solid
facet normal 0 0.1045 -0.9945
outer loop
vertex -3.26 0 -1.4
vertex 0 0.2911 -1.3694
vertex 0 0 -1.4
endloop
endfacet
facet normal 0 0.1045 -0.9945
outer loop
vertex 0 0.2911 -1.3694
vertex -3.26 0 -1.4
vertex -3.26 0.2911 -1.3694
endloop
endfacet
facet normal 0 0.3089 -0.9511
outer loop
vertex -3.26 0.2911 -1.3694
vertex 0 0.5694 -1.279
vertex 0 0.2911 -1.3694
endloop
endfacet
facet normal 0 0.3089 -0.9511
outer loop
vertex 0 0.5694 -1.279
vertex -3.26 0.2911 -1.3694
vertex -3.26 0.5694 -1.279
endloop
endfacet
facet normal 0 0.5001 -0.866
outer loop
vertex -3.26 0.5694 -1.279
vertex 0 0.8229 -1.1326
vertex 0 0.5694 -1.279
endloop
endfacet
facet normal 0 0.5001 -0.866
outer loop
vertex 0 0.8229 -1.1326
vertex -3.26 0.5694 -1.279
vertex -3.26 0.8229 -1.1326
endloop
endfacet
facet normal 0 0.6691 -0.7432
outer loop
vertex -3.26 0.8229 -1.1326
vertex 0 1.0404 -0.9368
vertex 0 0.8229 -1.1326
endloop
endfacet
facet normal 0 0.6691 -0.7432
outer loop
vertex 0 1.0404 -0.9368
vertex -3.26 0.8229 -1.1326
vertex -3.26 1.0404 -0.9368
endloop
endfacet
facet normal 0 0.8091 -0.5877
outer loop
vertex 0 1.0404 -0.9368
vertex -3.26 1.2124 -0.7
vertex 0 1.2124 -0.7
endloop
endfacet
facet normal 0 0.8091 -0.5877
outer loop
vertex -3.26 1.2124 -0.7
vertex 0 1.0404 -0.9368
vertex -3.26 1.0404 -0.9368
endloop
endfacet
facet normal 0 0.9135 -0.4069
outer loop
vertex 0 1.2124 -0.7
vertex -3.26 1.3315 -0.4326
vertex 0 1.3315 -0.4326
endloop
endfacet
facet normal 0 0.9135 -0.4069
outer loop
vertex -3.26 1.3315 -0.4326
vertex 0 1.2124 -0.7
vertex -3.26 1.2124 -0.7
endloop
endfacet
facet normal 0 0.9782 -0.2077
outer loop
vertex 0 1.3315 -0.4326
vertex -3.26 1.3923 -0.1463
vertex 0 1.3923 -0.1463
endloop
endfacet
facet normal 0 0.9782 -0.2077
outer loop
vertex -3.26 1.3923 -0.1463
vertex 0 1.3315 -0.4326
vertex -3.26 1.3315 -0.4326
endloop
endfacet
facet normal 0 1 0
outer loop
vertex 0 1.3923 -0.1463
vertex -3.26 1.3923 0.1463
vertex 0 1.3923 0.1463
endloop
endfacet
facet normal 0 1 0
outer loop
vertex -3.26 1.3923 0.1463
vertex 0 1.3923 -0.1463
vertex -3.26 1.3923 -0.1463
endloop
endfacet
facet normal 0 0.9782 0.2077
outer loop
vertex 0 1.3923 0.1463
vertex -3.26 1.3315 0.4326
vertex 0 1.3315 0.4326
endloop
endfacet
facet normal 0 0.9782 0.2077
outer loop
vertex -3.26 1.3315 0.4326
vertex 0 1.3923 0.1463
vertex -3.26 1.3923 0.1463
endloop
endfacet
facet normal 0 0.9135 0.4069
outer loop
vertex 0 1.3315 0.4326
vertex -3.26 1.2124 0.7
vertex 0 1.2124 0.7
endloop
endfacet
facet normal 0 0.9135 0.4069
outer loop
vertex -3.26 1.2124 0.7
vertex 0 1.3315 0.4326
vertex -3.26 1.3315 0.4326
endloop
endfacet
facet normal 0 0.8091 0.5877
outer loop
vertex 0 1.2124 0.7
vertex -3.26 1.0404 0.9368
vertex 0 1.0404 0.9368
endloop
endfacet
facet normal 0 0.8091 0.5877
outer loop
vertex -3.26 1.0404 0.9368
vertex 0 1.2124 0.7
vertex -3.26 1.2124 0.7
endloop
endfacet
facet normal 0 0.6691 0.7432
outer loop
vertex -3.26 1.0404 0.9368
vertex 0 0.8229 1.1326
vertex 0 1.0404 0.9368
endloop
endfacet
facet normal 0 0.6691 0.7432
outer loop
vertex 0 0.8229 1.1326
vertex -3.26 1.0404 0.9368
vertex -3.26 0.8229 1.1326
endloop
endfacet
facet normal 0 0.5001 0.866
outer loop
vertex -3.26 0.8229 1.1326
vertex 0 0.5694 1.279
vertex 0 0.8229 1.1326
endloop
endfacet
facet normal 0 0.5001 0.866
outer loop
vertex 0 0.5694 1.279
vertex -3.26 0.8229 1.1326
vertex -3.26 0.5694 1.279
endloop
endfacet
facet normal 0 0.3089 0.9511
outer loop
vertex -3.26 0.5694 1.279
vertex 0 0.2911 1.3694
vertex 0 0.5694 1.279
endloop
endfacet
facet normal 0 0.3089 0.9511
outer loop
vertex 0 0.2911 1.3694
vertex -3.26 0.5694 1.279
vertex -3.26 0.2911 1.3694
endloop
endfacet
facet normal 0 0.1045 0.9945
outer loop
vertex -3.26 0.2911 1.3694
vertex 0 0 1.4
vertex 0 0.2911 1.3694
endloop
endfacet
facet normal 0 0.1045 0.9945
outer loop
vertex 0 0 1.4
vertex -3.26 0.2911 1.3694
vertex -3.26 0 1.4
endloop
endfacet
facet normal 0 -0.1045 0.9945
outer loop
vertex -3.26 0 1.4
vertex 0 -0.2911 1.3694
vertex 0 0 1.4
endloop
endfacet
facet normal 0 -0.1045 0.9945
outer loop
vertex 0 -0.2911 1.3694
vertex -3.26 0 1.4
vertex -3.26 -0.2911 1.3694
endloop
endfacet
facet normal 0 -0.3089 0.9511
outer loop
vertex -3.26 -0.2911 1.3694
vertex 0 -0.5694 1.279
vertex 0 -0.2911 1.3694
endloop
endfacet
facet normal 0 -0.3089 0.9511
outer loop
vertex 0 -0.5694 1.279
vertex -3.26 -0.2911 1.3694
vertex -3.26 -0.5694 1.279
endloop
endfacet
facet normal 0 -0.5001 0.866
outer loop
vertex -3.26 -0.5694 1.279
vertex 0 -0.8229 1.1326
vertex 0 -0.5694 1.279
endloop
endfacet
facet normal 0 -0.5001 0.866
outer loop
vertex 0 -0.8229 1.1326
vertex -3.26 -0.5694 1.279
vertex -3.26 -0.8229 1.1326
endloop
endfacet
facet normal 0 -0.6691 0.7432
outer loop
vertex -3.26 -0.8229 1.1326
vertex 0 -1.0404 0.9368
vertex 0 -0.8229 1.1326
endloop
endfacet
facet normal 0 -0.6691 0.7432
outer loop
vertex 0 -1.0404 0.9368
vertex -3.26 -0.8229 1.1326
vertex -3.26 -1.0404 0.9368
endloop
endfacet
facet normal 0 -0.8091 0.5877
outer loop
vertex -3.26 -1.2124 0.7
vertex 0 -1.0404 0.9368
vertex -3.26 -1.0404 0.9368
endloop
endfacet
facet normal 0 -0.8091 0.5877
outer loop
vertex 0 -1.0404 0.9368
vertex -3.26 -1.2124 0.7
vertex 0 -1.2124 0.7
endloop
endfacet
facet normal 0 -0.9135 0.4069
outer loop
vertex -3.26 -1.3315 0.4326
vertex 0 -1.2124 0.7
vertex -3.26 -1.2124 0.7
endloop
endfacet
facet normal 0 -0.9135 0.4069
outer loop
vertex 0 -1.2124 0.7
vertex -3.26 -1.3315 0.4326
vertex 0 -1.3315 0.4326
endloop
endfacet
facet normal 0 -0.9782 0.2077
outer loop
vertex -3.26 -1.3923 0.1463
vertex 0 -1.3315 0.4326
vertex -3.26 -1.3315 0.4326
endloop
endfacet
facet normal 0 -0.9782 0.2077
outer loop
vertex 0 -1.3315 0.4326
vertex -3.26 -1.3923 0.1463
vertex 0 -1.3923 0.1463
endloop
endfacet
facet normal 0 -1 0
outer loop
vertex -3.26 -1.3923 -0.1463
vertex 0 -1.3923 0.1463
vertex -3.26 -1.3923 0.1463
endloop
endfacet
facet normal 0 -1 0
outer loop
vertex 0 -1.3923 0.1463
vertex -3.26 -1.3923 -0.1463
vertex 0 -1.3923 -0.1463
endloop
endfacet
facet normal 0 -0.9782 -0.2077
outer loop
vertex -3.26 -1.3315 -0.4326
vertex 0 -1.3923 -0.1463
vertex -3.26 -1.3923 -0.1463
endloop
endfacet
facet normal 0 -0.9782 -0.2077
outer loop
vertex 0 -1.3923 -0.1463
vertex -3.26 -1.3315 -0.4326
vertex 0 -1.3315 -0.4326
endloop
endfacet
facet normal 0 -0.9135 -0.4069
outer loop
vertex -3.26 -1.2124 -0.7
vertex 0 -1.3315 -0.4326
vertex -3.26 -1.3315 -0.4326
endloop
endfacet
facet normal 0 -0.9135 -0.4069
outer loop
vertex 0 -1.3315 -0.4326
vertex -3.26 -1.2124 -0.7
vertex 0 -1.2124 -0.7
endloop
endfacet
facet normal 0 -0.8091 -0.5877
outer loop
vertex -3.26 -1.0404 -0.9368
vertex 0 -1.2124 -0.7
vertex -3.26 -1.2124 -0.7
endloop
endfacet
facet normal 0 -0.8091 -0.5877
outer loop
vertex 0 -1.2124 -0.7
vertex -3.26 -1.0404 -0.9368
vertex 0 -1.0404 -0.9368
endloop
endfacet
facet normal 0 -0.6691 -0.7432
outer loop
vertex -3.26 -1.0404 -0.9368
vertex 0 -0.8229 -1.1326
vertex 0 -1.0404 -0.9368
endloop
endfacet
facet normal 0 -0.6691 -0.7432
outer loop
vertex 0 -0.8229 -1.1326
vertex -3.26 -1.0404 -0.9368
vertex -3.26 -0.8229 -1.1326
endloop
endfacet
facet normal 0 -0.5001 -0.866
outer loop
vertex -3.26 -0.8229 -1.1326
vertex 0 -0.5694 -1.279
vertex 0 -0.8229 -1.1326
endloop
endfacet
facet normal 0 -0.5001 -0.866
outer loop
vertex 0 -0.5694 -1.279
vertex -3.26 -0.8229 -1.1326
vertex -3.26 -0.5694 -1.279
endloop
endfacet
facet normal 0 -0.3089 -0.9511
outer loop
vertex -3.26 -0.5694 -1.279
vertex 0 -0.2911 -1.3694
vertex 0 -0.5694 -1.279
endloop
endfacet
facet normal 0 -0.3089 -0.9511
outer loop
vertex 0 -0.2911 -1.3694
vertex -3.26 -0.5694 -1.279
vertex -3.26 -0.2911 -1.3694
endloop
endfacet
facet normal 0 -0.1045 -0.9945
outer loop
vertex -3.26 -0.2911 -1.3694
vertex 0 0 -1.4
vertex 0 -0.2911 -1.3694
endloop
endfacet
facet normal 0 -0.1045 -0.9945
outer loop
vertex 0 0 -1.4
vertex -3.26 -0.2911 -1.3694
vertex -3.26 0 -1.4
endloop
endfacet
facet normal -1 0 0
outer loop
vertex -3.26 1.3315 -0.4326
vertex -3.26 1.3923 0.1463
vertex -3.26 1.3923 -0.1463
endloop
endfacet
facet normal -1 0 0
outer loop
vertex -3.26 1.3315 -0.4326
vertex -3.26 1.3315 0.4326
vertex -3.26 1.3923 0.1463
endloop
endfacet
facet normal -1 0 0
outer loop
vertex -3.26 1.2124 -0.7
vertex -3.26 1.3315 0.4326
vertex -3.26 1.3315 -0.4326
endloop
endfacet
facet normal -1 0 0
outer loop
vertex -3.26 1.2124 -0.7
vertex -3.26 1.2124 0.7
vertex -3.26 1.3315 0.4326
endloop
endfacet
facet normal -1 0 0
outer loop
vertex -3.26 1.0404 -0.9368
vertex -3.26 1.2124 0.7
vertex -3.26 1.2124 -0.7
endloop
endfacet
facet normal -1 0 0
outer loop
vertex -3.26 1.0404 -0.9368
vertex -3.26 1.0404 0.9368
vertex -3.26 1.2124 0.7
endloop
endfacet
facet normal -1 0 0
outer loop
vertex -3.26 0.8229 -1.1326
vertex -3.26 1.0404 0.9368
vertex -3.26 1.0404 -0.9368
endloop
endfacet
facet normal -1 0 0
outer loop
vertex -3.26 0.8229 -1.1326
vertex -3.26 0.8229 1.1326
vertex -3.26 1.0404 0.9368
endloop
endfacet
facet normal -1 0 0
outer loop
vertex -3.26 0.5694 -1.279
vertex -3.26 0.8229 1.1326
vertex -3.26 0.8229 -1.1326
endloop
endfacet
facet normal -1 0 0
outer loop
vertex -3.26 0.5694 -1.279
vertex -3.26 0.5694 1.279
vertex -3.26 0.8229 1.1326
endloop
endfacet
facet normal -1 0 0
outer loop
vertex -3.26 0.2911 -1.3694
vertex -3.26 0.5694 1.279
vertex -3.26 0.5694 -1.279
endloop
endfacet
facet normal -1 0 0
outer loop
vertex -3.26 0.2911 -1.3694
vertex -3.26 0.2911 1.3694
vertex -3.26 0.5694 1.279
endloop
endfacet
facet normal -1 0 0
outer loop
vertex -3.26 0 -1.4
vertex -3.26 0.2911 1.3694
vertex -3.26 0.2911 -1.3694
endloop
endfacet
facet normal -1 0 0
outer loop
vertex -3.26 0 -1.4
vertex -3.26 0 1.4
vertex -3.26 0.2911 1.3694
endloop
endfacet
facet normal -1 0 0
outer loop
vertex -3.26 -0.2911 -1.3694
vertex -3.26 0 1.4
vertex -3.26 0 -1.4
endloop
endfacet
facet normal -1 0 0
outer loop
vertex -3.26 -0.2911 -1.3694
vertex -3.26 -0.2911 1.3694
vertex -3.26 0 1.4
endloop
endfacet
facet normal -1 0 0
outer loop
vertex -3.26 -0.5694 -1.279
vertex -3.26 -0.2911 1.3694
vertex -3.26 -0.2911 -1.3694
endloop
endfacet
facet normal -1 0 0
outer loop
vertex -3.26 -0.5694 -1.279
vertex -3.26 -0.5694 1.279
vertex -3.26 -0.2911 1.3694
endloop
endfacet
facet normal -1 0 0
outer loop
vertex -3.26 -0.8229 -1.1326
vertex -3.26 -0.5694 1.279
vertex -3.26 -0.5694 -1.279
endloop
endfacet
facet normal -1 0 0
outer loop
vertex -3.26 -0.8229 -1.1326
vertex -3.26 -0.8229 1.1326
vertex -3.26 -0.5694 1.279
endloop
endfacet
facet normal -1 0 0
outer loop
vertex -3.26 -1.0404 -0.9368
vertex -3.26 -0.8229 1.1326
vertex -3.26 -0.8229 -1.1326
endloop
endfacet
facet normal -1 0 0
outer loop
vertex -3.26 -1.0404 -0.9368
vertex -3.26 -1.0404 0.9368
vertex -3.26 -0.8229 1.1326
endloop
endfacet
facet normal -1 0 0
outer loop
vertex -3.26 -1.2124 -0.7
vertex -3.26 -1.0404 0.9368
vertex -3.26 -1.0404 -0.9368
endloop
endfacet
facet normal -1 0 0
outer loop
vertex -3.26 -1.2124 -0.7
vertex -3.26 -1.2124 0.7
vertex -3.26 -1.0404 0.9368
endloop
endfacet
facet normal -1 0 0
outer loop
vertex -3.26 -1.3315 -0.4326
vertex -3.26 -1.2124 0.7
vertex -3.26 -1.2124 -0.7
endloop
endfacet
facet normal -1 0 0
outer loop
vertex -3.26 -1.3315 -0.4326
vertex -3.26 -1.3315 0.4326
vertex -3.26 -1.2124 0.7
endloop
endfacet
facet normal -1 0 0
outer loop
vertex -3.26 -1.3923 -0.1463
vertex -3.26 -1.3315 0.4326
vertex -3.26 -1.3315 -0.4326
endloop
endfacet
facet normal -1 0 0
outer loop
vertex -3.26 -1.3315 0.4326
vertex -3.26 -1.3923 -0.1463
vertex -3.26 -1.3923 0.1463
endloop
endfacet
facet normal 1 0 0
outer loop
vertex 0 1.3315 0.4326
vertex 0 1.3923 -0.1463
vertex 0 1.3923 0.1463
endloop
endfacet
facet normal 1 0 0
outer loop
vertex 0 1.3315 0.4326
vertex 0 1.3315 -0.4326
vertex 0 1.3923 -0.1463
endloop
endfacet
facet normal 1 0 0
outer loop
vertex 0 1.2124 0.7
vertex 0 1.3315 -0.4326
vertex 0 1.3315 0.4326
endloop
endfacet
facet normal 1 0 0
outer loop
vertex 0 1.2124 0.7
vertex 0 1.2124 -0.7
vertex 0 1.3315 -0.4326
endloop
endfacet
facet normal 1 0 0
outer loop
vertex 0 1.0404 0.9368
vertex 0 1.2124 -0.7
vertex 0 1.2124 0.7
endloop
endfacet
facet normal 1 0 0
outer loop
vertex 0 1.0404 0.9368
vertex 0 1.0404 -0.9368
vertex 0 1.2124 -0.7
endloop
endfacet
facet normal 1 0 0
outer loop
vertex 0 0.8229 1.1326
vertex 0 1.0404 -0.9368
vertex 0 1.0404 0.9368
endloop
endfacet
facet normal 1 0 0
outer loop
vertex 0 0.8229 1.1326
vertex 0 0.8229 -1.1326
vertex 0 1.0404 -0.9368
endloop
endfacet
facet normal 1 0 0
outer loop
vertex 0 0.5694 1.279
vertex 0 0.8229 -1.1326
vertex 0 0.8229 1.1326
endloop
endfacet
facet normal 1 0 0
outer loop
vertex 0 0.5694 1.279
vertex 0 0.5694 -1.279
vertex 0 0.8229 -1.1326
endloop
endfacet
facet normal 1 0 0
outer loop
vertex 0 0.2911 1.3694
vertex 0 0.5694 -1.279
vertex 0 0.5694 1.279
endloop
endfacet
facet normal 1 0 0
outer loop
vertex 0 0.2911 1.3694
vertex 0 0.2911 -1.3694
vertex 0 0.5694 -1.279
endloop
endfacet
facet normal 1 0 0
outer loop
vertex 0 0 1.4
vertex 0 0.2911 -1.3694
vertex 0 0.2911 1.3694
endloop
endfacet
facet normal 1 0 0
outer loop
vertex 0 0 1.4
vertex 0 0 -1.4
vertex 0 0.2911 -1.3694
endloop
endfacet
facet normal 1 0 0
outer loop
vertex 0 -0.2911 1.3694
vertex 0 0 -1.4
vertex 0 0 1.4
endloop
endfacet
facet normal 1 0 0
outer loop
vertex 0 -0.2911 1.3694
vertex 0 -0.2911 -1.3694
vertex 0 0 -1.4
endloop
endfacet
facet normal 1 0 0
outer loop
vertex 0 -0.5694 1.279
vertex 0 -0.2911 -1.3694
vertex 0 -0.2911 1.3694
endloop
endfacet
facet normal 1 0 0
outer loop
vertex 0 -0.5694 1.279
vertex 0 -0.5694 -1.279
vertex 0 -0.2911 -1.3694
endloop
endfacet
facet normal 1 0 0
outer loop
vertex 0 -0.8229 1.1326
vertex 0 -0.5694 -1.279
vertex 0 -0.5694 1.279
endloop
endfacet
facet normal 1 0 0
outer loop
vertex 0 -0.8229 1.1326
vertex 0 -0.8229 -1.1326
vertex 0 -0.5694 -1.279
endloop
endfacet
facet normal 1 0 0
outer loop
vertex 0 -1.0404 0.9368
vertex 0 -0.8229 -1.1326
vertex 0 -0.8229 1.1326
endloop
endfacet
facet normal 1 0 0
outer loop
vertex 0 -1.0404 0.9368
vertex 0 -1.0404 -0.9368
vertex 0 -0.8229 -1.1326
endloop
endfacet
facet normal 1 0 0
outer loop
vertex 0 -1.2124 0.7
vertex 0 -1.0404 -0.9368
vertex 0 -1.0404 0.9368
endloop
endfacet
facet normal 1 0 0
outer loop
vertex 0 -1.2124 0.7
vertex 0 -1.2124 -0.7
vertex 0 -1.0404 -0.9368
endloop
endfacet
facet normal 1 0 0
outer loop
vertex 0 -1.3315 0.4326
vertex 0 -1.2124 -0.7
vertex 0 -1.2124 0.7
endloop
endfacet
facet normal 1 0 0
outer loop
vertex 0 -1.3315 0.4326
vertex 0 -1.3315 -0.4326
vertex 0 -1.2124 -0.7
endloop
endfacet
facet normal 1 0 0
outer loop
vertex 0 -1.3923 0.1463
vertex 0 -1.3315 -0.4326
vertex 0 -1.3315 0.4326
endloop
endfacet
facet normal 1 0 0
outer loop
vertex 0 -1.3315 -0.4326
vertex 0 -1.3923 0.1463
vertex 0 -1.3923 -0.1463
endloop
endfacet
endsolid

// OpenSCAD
//this is modelling a 4/40 x 1/8 set screw

function SetScrewDiameter(3dPrinterTolerance=0)= 2.8 + 3dPrinterTolerance*2;
function SetScrewLength(3dPrinterTolerance=0)= 3.26 + 3dPrinterTolerance;

module SetScrew(3dPrinterTolerance=0)
{
	rotate([0,90,0])
	{
		translate([0,0,-SetScrewLength(3dPrinterTolerance)])
		{
			cylinder(h=SetScrewLength(3dPrinterTolerance), r=SetScrewDiameter(3dPrinterTolerance)/2, $fn=30);			
	}	}
}



SetScrew();
